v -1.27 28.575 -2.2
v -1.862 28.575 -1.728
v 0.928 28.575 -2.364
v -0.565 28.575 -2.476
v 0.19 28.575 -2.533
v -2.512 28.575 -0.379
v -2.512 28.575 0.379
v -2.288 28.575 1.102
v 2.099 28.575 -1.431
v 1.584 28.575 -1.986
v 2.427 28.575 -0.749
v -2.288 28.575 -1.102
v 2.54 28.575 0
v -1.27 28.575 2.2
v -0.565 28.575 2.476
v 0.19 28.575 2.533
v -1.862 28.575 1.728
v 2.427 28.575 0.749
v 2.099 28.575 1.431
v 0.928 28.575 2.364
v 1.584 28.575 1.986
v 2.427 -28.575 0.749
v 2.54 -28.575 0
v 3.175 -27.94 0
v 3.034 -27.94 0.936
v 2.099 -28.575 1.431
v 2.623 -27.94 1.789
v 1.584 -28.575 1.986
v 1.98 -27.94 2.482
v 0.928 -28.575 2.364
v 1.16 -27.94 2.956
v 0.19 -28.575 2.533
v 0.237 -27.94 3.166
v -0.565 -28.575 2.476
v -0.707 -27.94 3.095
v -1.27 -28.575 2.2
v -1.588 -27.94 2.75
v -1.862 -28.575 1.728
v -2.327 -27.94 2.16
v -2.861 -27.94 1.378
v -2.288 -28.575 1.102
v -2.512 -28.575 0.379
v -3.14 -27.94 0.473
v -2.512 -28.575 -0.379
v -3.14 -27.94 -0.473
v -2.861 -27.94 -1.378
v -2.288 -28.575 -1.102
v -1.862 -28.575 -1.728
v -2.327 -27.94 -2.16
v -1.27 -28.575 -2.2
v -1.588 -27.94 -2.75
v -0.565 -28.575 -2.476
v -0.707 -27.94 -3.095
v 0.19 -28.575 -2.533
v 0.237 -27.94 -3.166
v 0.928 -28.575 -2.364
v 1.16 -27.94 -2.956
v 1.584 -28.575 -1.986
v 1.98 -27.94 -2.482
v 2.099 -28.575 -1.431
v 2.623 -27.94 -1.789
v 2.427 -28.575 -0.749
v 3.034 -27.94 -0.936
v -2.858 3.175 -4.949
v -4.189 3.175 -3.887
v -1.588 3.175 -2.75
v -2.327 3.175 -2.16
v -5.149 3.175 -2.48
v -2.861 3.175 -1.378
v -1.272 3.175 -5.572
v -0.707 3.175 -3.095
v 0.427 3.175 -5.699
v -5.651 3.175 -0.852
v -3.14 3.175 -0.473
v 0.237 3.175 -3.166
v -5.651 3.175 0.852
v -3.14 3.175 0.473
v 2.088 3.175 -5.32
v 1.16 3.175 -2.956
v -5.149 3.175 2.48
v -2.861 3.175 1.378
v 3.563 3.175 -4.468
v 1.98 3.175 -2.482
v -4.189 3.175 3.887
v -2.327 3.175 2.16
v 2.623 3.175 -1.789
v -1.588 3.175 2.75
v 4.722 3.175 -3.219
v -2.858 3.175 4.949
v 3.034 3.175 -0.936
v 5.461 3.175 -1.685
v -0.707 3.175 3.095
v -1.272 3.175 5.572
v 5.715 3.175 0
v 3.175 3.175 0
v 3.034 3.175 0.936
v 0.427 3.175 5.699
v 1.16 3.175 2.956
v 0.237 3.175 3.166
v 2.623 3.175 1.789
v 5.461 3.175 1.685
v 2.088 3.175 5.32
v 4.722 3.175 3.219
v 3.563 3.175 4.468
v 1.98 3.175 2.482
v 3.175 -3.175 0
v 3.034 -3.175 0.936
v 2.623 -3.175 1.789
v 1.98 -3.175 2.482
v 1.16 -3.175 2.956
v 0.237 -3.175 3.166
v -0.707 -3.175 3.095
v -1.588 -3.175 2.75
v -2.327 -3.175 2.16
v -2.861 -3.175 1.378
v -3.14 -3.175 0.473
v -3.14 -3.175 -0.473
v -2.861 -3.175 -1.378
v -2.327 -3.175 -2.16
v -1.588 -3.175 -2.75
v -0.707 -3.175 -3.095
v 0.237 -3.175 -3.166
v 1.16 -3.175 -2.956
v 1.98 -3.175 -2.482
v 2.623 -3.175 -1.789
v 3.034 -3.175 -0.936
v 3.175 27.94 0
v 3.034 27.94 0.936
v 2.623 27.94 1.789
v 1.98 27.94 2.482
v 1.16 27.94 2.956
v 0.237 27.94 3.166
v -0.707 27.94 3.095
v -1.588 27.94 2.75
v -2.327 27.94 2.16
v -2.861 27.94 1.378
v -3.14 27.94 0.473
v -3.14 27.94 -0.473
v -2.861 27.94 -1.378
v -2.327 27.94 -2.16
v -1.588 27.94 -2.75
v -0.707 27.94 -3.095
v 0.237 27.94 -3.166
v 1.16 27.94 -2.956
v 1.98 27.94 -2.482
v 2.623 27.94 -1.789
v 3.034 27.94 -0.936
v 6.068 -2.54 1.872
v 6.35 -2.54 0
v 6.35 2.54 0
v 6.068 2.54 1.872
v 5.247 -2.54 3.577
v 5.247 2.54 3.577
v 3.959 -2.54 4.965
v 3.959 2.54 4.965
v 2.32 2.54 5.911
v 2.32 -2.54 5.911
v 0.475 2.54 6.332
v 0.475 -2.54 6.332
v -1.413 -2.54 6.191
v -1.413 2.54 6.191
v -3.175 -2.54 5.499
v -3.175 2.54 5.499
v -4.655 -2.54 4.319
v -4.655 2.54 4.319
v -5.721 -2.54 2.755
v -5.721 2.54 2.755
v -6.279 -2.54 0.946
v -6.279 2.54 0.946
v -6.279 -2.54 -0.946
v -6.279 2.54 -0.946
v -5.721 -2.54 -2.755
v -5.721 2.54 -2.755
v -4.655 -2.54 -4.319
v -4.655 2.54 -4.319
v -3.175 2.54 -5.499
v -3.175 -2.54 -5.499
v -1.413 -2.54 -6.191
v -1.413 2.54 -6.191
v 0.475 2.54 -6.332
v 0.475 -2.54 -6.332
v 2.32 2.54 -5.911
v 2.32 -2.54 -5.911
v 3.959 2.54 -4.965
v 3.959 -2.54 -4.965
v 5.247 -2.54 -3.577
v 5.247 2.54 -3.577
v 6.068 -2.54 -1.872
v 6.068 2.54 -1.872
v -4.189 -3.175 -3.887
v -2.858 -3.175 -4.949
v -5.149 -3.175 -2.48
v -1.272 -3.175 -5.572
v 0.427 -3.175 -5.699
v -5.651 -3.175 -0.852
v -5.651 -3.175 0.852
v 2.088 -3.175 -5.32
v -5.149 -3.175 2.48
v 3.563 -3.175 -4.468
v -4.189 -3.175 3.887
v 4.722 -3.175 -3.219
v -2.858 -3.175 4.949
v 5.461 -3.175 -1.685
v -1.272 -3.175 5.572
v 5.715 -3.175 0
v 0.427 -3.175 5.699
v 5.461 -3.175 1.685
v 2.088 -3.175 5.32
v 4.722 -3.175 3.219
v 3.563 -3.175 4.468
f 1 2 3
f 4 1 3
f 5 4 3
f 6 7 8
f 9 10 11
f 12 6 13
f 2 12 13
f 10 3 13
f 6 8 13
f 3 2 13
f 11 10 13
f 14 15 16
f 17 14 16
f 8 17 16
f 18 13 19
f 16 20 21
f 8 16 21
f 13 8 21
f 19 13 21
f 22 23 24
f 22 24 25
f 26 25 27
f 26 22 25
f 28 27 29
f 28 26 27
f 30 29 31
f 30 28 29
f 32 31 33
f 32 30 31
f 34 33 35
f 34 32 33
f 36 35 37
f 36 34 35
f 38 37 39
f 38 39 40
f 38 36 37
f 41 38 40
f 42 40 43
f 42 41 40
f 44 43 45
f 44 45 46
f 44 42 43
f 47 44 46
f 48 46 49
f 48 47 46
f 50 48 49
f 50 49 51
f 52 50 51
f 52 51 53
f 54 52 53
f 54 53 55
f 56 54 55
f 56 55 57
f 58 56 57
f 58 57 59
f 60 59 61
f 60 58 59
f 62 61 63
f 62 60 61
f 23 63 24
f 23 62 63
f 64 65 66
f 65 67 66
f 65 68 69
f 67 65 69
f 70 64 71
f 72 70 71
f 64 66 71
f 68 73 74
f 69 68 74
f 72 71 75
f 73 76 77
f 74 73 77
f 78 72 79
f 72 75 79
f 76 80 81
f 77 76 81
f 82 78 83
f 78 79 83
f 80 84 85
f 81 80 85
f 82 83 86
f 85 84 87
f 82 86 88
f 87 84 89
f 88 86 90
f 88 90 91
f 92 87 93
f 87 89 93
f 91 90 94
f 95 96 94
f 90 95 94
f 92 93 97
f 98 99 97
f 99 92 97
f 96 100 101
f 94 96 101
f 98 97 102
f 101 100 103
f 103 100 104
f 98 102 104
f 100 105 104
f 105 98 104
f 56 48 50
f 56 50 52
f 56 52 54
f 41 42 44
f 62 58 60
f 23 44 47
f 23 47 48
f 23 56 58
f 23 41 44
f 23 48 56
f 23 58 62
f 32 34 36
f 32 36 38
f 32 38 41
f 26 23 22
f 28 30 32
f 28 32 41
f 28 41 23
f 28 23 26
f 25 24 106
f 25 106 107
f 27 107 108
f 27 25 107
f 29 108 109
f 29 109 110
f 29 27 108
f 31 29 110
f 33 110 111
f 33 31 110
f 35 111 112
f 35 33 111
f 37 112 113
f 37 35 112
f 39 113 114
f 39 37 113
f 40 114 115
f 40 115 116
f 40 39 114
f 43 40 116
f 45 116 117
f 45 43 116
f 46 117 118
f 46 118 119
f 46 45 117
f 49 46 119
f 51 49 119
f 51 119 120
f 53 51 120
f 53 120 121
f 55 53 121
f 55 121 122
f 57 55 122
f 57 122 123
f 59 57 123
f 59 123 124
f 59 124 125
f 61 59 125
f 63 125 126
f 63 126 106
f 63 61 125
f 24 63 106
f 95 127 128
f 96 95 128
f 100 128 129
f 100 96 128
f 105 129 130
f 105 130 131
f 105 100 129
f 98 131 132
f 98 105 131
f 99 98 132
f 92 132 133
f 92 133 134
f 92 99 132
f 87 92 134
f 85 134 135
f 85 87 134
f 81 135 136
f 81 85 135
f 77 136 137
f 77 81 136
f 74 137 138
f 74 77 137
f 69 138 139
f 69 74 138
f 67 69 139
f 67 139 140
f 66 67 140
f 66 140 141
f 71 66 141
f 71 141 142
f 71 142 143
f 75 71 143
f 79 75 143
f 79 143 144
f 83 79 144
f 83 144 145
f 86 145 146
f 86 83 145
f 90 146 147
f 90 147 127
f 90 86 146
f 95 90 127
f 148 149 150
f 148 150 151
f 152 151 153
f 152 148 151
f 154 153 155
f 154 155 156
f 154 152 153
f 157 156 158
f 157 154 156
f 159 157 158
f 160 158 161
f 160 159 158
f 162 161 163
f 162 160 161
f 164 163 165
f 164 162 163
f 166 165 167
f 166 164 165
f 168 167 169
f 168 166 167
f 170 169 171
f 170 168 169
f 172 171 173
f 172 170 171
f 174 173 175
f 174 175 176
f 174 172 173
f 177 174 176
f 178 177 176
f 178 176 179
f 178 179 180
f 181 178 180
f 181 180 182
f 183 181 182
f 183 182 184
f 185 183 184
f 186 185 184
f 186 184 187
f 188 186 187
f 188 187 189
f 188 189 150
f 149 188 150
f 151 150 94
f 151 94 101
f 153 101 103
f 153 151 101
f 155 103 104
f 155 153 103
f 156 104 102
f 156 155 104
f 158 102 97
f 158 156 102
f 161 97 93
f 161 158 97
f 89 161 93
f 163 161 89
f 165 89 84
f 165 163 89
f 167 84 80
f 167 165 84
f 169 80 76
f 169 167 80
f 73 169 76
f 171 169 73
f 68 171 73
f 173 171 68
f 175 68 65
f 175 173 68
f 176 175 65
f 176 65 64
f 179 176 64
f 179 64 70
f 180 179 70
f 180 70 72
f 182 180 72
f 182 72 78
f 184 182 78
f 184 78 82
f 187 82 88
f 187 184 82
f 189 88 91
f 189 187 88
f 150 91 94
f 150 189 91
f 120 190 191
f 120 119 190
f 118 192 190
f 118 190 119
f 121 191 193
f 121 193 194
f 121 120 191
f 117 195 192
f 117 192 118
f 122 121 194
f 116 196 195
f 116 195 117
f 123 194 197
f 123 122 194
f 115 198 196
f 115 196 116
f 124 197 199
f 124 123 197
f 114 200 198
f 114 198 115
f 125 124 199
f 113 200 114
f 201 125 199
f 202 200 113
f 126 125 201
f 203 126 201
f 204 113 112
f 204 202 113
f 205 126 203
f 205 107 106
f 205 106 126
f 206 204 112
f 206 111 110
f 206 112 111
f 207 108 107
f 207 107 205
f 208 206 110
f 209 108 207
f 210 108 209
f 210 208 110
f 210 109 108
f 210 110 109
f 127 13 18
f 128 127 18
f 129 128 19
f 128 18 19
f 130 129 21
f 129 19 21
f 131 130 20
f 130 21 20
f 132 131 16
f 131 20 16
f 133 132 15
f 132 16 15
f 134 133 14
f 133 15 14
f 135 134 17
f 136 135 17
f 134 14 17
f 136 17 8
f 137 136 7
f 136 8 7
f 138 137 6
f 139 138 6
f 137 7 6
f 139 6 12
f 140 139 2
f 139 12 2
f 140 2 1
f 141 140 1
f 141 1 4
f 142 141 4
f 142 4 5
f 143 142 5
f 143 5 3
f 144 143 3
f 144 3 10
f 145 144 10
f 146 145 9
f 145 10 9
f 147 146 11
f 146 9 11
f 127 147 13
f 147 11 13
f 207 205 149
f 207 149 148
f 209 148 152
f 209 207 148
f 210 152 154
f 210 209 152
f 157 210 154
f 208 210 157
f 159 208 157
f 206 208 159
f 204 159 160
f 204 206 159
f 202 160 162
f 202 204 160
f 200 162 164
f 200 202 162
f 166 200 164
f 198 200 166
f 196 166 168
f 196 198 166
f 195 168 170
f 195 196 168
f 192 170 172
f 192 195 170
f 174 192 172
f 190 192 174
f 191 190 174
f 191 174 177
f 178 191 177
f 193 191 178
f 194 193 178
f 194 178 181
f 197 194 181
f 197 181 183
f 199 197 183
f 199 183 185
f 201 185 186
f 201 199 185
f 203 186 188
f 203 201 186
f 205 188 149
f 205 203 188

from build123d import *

# Parameters (mm, degrees)
F0_R     = 3.175
F1_DEPTH = 28.575
F0_R_2   = 6.35
F2_DEPTH = 3.175
F3_SIZE  = 0.635


with BuildPart() as f1:
    # F0 (on Front) → F1 (new body, symmetric)
    with BuildSketch(Plane.XZ):
        Circle(F0_R)
    extrude(amount=F1_DEPTH, both=True)

    # F0 (on Front) → F2 (join, symmetric)
    with BuildSketch(Plane.XZ):
        Circle(F0_R_2)
        Circle(F0_R, mode=Mode.SUBTRACT)
    extrude(amount=F2_DEPTH, both=True)

    # F3
    f3_edges = [f1.edges().sort_by_distance(p)[0] for p in [
        (-3.175, -28.575, 0),
        (-3.175, 28.575, 0),
        (-6.35, -3.175, 0),
        (-6.35, 3.175, 0),
    ]]
    chamfer(f3_edges, length=F3_SIZE)


solid = f1.part
